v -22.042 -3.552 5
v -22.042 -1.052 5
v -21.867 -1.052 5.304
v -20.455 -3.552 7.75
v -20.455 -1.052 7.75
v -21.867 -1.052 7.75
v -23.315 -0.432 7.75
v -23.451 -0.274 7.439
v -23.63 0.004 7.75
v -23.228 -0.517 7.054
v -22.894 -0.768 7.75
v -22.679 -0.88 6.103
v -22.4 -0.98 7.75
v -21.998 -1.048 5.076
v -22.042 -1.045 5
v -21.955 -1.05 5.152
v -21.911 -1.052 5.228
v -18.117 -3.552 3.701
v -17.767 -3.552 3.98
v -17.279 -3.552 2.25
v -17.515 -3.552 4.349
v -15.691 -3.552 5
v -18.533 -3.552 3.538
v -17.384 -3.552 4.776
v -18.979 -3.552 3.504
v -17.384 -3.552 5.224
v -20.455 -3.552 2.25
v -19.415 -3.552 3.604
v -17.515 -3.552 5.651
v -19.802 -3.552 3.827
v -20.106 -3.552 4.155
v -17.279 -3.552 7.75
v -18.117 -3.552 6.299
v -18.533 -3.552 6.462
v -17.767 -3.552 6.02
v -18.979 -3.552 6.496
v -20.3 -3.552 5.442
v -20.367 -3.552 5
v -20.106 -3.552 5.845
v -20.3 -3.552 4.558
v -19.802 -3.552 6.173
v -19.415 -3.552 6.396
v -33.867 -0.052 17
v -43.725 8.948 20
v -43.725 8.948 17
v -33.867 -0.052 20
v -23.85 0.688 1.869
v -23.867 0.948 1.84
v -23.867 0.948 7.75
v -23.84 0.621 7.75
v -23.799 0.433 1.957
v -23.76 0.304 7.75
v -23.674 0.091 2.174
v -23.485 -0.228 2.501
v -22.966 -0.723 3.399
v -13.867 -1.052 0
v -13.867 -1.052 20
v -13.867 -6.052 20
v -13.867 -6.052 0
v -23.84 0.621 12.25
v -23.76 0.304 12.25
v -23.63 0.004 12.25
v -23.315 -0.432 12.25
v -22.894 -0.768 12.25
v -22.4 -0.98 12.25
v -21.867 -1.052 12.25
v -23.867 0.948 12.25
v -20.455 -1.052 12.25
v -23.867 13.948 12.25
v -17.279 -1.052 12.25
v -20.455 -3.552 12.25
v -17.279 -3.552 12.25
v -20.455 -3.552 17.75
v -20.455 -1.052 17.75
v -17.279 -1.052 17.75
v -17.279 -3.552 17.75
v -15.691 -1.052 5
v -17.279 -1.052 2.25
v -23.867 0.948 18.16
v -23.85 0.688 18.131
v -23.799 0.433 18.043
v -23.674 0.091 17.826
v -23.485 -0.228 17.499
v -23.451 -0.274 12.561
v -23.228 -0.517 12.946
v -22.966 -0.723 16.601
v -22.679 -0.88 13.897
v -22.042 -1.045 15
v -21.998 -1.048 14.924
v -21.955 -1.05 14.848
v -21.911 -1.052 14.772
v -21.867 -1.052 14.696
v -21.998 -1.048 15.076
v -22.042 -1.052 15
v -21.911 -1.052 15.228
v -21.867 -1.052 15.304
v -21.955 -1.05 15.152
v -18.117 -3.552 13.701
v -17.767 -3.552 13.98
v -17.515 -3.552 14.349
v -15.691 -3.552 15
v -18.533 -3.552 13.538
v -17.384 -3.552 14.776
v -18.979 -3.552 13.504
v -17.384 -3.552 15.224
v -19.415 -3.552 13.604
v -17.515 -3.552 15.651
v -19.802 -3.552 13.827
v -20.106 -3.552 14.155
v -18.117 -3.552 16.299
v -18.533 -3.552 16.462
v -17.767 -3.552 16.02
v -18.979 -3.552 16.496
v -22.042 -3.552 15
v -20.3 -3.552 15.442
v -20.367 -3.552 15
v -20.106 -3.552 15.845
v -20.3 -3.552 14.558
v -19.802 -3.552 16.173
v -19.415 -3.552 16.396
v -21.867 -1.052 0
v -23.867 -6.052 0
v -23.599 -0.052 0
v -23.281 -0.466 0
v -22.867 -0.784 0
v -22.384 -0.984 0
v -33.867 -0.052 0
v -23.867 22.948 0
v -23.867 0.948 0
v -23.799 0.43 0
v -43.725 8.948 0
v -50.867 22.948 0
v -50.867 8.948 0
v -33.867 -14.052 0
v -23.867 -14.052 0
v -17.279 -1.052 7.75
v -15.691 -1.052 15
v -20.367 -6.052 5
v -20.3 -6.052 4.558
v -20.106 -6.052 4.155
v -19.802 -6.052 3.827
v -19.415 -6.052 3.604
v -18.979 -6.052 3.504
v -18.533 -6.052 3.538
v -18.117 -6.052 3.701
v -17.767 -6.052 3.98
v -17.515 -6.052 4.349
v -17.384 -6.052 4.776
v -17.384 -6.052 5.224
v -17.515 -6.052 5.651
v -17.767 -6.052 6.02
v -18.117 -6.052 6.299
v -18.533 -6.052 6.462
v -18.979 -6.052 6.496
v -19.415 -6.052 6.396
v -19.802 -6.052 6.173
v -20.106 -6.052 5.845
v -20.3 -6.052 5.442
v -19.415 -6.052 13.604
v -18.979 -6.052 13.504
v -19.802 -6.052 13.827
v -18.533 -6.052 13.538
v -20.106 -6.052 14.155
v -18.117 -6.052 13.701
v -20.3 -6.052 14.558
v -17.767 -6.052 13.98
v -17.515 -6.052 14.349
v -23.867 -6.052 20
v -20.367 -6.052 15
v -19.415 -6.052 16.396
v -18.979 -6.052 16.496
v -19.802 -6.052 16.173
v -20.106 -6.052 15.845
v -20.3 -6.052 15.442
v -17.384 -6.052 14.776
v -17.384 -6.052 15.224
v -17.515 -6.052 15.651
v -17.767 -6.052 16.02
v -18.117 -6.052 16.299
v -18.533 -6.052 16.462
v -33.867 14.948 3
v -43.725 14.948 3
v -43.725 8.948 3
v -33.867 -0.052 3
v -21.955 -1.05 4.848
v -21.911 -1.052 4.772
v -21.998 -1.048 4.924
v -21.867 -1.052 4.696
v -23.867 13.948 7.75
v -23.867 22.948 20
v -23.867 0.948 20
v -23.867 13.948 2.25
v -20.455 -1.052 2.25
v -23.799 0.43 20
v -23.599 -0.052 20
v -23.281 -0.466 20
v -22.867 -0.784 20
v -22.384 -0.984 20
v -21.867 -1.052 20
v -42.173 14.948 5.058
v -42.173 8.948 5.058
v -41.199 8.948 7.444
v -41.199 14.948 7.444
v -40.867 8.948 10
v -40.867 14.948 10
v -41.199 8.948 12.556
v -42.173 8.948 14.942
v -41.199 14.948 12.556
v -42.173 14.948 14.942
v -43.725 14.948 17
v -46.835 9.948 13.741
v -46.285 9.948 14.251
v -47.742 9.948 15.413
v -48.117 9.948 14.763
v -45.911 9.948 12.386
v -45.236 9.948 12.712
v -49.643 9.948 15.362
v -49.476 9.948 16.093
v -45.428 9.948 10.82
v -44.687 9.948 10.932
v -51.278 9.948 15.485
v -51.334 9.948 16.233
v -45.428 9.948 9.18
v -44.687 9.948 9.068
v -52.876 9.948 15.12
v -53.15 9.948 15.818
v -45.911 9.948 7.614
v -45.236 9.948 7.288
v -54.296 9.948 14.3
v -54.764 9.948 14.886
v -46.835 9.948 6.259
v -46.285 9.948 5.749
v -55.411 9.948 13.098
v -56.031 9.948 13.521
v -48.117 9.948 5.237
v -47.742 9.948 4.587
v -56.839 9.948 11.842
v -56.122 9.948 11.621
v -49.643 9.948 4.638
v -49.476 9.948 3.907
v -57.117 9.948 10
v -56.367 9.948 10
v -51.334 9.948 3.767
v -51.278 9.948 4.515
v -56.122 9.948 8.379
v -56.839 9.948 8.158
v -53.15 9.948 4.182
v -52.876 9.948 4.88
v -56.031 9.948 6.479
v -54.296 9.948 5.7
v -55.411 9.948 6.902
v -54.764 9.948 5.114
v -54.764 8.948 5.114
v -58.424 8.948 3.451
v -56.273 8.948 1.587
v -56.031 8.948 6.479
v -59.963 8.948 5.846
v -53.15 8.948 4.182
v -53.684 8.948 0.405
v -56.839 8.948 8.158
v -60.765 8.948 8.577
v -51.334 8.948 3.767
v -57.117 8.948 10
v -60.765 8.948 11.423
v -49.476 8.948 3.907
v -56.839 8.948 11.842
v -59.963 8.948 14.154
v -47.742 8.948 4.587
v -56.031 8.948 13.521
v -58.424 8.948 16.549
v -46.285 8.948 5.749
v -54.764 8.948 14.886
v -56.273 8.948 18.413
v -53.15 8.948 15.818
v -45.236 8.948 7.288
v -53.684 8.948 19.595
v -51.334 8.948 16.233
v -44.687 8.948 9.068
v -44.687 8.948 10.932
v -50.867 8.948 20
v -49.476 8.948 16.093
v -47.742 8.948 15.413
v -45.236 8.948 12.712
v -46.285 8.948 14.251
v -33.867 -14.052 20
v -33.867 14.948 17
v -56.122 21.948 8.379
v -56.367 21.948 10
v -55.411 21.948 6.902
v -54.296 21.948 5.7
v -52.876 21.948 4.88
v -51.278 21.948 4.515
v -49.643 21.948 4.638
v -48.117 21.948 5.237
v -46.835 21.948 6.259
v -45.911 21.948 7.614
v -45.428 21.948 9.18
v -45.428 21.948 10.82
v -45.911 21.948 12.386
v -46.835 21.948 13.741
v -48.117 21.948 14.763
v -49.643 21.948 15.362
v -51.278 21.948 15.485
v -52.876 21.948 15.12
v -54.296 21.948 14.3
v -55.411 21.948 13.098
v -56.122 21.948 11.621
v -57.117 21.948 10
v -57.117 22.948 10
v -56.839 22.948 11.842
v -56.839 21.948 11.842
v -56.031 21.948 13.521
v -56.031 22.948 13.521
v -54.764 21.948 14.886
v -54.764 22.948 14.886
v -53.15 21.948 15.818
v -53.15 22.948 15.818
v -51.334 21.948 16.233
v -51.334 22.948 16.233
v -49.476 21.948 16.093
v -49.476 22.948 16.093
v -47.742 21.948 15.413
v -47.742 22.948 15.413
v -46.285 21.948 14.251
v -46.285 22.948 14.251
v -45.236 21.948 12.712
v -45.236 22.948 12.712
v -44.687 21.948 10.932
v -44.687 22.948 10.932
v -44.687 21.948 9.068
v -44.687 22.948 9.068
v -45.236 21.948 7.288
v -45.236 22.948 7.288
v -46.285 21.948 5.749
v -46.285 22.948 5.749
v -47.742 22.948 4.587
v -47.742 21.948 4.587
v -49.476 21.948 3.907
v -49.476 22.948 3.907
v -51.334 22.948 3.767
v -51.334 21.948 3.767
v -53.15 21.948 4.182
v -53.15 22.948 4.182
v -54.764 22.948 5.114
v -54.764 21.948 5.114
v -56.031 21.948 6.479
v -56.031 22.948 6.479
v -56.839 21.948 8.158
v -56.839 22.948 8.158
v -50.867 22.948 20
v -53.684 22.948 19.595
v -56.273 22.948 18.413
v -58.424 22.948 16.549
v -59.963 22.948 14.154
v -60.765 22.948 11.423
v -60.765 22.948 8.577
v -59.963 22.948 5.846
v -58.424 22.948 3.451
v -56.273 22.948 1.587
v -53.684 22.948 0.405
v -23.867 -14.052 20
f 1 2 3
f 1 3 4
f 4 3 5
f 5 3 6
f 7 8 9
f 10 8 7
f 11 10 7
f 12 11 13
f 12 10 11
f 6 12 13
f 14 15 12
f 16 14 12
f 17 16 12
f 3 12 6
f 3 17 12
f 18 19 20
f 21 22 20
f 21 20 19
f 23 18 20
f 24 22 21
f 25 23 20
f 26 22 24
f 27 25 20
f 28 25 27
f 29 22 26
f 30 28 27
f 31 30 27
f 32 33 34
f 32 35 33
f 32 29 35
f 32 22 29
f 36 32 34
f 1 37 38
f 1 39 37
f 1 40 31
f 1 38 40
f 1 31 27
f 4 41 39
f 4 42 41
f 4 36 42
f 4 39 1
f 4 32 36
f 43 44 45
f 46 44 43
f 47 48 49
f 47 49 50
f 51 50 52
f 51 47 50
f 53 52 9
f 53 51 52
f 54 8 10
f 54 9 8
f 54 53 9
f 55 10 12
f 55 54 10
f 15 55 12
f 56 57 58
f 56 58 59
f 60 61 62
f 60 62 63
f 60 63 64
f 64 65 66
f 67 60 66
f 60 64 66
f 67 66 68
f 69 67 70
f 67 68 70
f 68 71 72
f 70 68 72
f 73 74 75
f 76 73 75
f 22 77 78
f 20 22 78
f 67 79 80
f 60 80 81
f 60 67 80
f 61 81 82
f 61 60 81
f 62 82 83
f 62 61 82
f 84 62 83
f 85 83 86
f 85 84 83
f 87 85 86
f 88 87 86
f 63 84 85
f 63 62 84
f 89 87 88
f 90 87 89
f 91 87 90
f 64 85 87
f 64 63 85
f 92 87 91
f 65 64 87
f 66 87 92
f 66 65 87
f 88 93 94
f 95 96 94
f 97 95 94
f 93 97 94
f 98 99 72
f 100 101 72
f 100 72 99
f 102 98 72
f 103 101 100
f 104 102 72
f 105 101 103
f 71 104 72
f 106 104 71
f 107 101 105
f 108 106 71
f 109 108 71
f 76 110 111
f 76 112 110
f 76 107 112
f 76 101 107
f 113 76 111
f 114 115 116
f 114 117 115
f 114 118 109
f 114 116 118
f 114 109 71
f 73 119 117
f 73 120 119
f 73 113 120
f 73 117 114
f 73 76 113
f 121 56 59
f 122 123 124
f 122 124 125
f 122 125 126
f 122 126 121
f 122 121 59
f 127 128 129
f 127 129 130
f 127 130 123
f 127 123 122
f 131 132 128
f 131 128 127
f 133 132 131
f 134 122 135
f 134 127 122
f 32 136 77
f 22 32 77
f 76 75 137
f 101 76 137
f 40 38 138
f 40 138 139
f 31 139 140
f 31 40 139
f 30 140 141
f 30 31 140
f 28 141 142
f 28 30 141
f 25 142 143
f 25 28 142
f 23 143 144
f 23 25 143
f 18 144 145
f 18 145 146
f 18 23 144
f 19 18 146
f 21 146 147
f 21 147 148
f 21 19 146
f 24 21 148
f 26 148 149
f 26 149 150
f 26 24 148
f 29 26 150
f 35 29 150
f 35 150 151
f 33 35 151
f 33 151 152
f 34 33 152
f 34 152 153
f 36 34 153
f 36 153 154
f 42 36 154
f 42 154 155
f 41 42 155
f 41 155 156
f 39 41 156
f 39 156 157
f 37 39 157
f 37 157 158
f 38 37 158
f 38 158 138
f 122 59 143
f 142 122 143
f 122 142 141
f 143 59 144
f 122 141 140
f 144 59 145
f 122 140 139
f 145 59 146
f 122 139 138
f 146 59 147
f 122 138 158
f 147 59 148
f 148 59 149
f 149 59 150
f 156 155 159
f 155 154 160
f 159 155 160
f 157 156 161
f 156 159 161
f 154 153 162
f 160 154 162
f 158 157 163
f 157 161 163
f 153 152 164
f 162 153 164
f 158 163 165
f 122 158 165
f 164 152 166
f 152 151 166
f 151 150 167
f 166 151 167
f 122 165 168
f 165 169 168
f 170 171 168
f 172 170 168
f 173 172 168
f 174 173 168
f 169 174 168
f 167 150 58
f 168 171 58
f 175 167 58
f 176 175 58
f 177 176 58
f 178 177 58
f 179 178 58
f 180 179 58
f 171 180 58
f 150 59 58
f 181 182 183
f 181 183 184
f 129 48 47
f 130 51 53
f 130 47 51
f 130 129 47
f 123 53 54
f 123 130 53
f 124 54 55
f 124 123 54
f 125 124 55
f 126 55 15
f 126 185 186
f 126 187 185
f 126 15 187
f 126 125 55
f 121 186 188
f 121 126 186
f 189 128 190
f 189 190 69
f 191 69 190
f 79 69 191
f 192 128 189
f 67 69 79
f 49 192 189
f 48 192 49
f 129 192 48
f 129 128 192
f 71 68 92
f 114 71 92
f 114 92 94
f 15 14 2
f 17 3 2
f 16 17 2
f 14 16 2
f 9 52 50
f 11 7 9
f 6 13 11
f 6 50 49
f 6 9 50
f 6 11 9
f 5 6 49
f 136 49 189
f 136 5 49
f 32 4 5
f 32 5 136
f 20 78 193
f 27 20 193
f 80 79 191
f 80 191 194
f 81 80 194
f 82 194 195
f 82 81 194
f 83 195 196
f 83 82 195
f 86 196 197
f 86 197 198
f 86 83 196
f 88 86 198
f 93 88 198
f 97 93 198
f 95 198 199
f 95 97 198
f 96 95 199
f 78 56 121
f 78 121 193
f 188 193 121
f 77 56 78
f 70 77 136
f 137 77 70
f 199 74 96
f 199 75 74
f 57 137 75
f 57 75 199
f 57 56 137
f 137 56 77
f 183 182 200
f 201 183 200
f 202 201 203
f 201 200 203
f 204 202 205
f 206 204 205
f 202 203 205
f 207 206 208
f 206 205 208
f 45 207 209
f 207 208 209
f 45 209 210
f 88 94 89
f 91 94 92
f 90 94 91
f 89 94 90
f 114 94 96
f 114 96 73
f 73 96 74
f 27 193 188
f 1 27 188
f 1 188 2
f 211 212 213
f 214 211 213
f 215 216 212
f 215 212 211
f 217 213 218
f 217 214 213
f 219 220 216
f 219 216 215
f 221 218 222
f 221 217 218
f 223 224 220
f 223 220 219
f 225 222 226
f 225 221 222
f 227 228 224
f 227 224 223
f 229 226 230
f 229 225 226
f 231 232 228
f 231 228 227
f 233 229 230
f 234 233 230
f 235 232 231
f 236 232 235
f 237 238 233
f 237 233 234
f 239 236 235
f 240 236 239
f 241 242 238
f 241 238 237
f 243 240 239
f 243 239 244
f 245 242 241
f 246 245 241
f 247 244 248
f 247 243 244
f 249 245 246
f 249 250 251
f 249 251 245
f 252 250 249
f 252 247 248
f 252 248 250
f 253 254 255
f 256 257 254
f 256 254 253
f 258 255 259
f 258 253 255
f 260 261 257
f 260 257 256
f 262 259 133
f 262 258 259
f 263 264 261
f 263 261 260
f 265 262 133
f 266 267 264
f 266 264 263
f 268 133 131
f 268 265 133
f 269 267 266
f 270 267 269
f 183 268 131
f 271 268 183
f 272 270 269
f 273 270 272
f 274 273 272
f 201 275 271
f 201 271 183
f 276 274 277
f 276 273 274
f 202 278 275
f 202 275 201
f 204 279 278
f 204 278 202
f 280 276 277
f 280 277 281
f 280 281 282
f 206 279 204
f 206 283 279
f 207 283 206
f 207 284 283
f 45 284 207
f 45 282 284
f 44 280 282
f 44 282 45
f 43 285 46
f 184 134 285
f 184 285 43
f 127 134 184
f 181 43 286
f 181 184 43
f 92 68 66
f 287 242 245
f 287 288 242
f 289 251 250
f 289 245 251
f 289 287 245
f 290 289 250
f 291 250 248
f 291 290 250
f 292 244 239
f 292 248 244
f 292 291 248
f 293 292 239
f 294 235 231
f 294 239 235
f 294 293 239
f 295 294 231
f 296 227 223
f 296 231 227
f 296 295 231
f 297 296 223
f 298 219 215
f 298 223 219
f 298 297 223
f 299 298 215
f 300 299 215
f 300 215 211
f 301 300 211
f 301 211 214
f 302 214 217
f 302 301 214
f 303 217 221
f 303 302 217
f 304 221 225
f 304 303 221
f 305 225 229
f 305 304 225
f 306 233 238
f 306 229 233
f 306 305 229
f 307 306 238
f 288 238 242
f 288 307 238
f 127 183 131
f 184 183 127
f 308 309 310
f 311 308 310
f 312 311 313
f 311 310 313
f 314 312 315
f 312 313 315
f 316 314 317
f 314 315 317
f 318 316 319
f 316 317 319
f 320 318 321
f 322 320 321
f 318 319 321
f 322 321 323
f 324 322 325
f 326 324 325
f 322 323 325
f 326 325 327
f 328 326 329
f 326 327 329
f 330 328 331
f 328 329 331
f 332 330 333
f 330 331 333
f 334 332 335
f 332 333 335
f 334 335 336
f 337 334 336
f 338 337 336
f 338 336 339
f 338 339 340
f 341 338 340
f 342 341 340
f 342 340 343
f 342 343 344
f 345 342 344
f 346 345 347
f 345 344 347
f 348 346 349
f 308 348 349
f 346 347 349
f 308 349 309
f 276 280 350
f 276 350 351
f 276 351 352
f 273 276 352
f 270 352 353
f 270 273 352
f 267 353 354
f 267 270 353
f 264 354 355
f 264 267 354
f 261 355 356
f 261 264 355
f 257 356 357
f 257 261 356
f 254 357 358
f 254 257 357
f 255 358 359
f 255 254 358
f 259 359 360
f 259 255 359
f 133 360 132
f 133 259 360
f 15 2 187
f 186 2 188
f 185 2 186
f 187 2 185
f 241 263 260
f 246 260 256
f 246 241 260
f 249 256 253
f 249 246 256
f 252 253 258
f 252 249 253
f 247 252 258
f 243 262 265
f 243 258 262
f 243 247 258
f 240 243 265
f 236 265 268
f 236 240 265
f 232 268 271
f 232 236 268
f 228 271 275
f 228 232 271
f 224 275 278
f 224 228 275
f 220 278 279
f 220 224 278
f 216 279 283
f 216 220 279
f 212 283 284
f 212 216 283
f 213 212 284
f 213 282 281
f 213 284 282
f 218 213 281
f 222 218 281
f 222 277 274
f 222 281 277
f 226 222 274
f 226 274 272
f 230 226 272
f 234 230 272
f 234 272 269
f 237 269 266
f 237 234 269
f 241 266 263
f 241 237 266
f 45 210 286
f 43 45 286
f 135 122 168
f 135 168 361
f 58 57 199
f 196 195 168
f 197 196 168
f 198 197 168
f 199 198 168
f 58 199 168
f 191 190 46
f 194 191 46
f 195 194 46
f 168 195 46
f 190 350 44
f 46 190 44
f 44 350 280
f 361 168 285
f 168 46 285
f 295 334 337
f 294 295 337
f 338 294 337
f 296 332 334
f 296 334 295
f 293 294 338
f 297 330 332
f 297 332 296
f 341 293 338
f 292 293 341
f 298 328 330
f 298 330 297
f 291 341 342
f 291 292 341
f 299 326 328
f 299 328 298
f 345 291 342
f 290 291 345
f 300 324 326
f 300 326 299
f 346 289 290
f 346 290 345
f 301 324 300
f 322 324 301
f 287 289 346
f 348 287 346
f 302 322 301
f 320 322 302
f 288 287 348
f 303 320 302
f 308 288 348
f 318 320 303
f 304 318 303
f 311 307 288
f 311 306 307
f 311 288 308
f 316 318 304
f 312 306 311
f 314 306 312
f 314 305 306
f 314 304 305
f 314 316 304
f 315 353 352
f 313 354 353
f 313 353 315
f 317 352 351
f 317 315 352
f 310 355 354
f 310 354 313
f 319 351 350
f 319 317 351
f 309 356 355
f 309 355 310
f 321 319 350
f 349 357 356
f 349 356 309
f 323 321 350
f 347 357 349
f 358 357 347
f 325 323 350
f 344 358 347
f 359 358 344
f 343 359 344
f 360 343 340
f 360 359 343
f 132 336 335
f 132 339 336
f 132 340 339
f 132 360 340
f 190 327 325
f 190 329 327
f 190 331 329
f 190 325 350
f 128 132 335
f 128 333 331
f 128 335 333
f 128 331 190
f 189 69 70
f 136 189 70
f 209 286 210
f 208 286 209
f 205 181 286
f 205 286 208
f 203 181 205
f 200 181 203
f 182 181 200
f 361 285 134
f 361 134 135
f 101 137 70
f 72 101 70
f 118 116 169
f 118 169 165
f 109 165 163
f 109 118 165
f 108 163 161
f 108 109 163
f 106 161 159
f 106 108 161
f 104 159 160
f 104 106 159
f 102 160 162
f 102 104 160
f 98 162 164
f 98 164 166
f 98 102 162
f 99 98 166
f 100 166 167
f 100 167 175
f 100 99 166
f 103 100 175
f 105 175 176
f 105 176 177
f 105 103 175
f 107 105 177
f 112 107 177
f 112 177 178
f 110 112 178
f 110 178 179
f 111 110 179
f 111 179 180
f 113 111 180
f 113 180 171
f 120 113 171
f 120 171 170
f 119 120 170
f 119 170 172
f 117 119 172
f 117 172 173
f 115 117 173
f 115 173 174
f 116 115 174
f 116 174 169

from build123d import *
from build123d.topology import SkipClean

# Parameters (mm, degrees)
EXTRUDE_1_DEPTH           = 20
SKETCH_3_R                = 5.5
CUT_EXTRUDE_2_DEPTH       = 10
SKETCH_9_R                = 6.25
CUT_EXTRUDE_6_DEPTH       = 1
SKETCH_11_W               = 20
SKETCH_11_H               = 5
EXTRUDE_4_DEPTH           = 10
CUT_EXTRUDE_8_REACH       = 78.472
SKETCH_12_R               = 1.5
SKETCH_13_R               = 3
CUT_EXTRUDE_9_DEPTH       = 2.5
SKETCH_14_R               = 10
SKETCH_14_R_2             = 5.5
EXTRUDE_5_DEPTH           = 6
CUT_EXTRUDE_START         = -1
SKETCH_6_R                = 6.25
CUT_EXTRUDE_10_DEPTH      = 1
SKETCH_15_W               = 20
SKETCH_15_H               = 5
EXTRUDE_6_DEPTH           = 5
SKETCH_16_W               = 17
SKETCH_16_H               = 3
EXTRUDE_7_DEPTH           = 15
CUT_EXTRUDE_11_DEPTH      = 70.961190435
CUT_EXTRUDE_11_DEPTH_BACK = 70.961190435
EXTRUDE_START             = -5
SKETCH_3D_3_R             = 1.5
EXTRUDE_8_DEPTH           = 5
CUT_EXTRUDE_12_DEPTH      = 2.5
FILLET_1_R                = 2
CUT_EXTRUDE_14_DEPTH      = 76.06644022
SKETCH_21_W               = 6.587713241
SKETCH_21_H               = 4.5
EXTRUDE_9_DEPTH           = 15
SKETCH_23_W               = 25
SKETCH_23_H               = 20
CUT_EXTRUDE_16_DEPTH      = 5
CUT_EXTRUDE_17_DEPTH      = 10


with BuildPart() as part:
    # 草图1 → 凸台-拉伸1 (new body)
    with BuildSketch(Plane.XY):
        Polygon((-63.866818046, 22.947717095), (-23.866818046, 22.947717095), (-23.866818046, -19.052282905), (-33.866818046, -19.052282905), (-33.866818046, 14.947717095), (-63.866818046, 14.947717095), align=None)
    extrude(amount=EXTRUDE_1_DEPTH)

    # 草图3 → 切除-拉伸2 (cut)
    with BuildSketch(Plane(origin=(0, 22.947717095, 0), x_dir=(-1, 0, 0), z_dir=(0, 1, 0))):
        with Locations((50.866818046, 10)):
            Circle(SKETCH_3_R)
    extrude(amount=-CUT_EXTRUDE_2_DEPTH, mode=Mode.SUBTRACT)

    # 草图9 → 切除-拉伸6 (cut)
    with BuildSketch(Plane(origin=(0, 22.947717095, 0), x_dir=(1, 0, 0), z_dir=(0, 1, 0))):
        with Locations(Location((-50.866818046, -10, 0), (0, 0, 180))):
            Circle(SKETCH_9_R)
    extrude(amount=-CUT_EXTRUDE_6_DEPTH, mode=Mode.SUBTRACT)

    # 草图11 → 凸台-拉伸4 (add)
    with BuildSketch(Plane(origin=(-23.866818046, 0, 0), x_dir=(0, 0, -1), z_dir=(1, 0, 0))):
        with Locations((-10, -16.552282905)):
            Rectangle(SKETCH_11_W, SKETCH_11_H)
    extrude(amount=EXTRUDE_4_DEPTH)

    # 草图12 → 切除-拉伸8 (cut, up to next)
    with BuildSketch(Plane(origin=(0, -14.052282905, 0), x_dir=(-1, 0, 0), z_dir=(0, 1, 0)), mode=Mode.PRIVATE) as cut_extrude_8_sk1:
        with Locations((18.866818046, 5)):
            Circle(SKETCH_12_R)
    cut_extrude_8_tool1 = extrude(cut_extrude_8_sk1.sketch, amount=-CUT_EXTRUDE_8_REACH, mode=Mode.PRIVATE) & part.part
    # 草图12 → 切除-拉伸8 (cut, up to next)
    with BuildSketch(Plane(origin=(0, -14.052282905, 0), x_dir=(-1, 0, 0), z_dir=(0, 1, 0)), mode=Mode.PRIVATE) as cut_extrude_8_sk2:
        with Locations((18.866818046, 15)):
            Circle(SKETCH_12_R)
    cut_extrude_8_tool2 = extrude(cut_extrude_8_sk2.sketch, amount=-CUT_EXTRUDE_8_REACH, mode=Mode.PRIVATE) & part.part
    add(cut_extrude_8_tool1.solids().sort_by_distance((-18.866818, -14.052283, 5))[0], mode=Mode.SUBTRACT)
    add(cut_extrude_8_tool2.solids().sort_by_distance((-18.866818, -14.052283, 15))[0], mode=Mode.SUBTRACT)

    # 草图13 → 切除-拉伸9 (cut)
    with BuildSketch(Plane.XZ.offset(19.052282905)):
        with Locations(Location((-18.866818046, 15, 0), (0, 0, 270))):
            Circle(SKETCH_13_R)
        with Locations(Location((-18.866818046, 5, 0), (0, 0, 270))):
            Circle(SKETCH_13_R)
    extrude(amount=-CUT_EXTRUDE_9_DEPTH, mode=Mode.SUBTRACT)

    # 草图14 → 凸台-拉伸5 (add)
    with SkipClean():  # the faces are left unmerged after this step: merging them gives an invalid solid
        with BuildSketch(Plane.XZ.offset(-14.947717095)):
            with Locations(Location((-50.866818046, 10, 0), (0, 0, 270))):
                Circle(SKETCH_14_R)
            with Locations(Location((-50.866818046, 10, 0), (0, 0, 180))):
                Circle(SKETCH_14_R_2, mode=Mode.SUBTRACT)
        extrude(amount=EXTRUDE_5_DEPTH)

    # 草图6 → 切除-拉伸10 (cut)
    with BuildSketch(Plane.XZ.offset(-8.947717095).offset(CUT_EXTRUDE_START)):
        with Locations(Location((-50.866818046, 10, 0), (0, 0, 180))):
            Circle(SKETCH_6_R)
    extrude(amount=CUT_EXTRUDE_10_DEPTH, mode=Mode.SUBTRACT)

    # 草图15 → 凸台-拉伸6 (add)
    with BuildSketch(Plane(origin=(-13.866818046, 0, 0), x_dir=(0, 0, -1), z_dir=(1, 0, 0))):
        with Locations((-10, -16.552282905)):
            Rectangle(SKETCH_15_W, SKETCH_15_H)
    extrude(amount=EXTRUDE_6_DEPTH)

    # 草图16 → 凸台-拉伸7 (add)
    with BuildSketch(Plane.XZ.offset(-14.947717095)):
        with Locations((-42.366818046, 18.5)):
            Rectangle(SKETCH_16_W, SKETCH_16_H)
        with Locations((-42.366818046, 1.5)):
            Rectangle(SKETCH_16_W, SKETCH_16_H)
    extrude(amount=EXTRUDE_7_DEPTH)

    # 草图17 → 切除-拉伸11 (cut, two sides: drawn at the far end of the back side and taken through both)
    with BuildSketch(Plane(origin=(0, 0, 17), x_dir=(-1, 0, 0), z_dir=(0, 0, -1)).offset(-CUT_EXTRUDE_11_DEPTH_BACK)):
        Polygon((50.866818046, 8.947717095), (43.725389617, 8.947717095), (33.866818046, -0.052282905), (50.866818046, -0.052282905), align=None)
    extrude(amount=CUT_EXTRUDE_11_DEPTH + CUT_EXTRUDE_11_DEPTH_BACK, mode=Mode.SUBTRACT)

    # Sketch 3D_3 → 凸台-拉伸8 (add)
    with BuildSketch(Plane(origin=(-23.866818046, -6.052282905, 20), x_dir=(0.447213595499958, 0, -0.894427190999916), z_dir=(0, -1, 0)).offset(EXTRUDE_START)):
        Polygon((0, 0), (4.472135955, 8.94427191), (22.360679775, 0), (17.88854382, -8.94427191), align=None)
        with Locations(Location((6.708203932, 2.236067977, 0), (0, 0, 243.434948823))):
            Circle(SKETCH_3D_3_R, mode=Mode.SUBTRACT)
        with Locations(Location((15.652475842, -2.236067977, 0), (0, 0, 243.434948823))):
            Circle(SKETCH_3D_3_R, mode=Mode.SUBTRACT)
    extrude(amount=EXTRUDE_8_DEPTH)

    # 草图18 → 切除-拉伸12 (cut)
    with BuildSketch(Plane(origin=(0, -1.052282905, 0), x_dir=(-1, 0, 0), z_dir=(0, 1, 0))):
        Polygon((15.691391565, 15), (17.279104805, 12.25), (20.454531286, 12.25), (22.042244526, 15), (20.454531286, 17.75), (17.279104805, 17.75), align=None)
        Polygon((15.691391565, 5), (17.279104805, 2.25), (20.454531286, 2.25), (22.042244526, 5), (20.454531286, 7.75), (17.279104805, 7.75), align=None)
    extrude(amount=-CUT_EXTRUDE_12_DEPTH, mode=Mode.SUBTRACT)

    # 圆角1
    # the kernel refuses this fillet: 2 mm, written as the material it adds along each edge
    with BuildSketch(Plane(origin=(-23.866818046, -1.052282905, 0), x_dir=(0, 1, 0), z_dir=(0, 0, 1))) as fillet_1_piece_1_section:
        with BuildLine():
            CenterArc((FILLET_1_R, -FILLET_1_R), FILLET_1_R, 90, 90)
            Line((0, -FILLET_1_R), (0, 0))
            Line((0, 0), (FILLET_1_R, 0))
        make_face()
    fillet_1_piece_1 = extrude(amount=20, mode=Mode.PRIVATE)
    fillet_1_piece_1 = split(fillet_1_piece_1, bisect_by=Plane(origin=(-20.802583542, -0.671658343, 2.852844192), z_dir=(-0.8660254037844387, 0, -0.5000000000000001)), keep=Keep.TOP, mode=Mode.PRIVATE)
    fillet_1_piece_1 = split(fillet_1_piece_1, bisect_by=Plane(origin=(-23.907001975, -0.671658343, 1.770145354), z_dir=(0.8660254037844387, 0, -0.5000000000000003)), keep=Keep.TOP, mode=Mode.PRIVATE)
    add(fillet_1_piece_1)
    with BuildSketch(Plane(origin=(-23.866818046, -1.052282905, 0), x_dir=(0, 1, 0), z_dir=(0, 0, 1))) as fillet_1_piece_2_section:
        with BuildLine():
            CenterArc((FILLET_1_R, -FILLET_1_R), FILLET_1_R, 90, 90)
            Line((0, -FILLET_1_R), (0, 0))
            Line((0, 0), (FILLET_1_R, 0))
        make_face()
    fillet_1_piece_2 = extrude(amount=20, mode=Mode.PRIVATE)
    fillet_1_piece_2 = split(fillet_1_piece_2, bisect_by=Plane(origin=(-22.4188867, -0.519681884, 5.652363381), z_dir=(-0.8660254037844387, 0, -0.5000000000000001)), keep=Keep.TOP, mode=Mode.PRIVATE)
    fillet_1_piece_2 = split(fillet_1_piece_2, bisect_by=Plane(origin=(-22.4188867, -0.519681884, 4.347636619), z_dir=(-0.8660254037844387, 0, 0.5000000000000003)), keep=Keep.TOP, mode=Mode.PRIVATE)
    add(fillet_1_piece_2)
    with BuildSketch(Plane(origin=(-23.866818046, -1.052282905, 0), x_dir=(0, 1, 0), z_dir=(0, 0, 1))) as fillet_1_piece_3_section:
        with BuildLine():
            CenterArc((FILLET_1_R, -FILLET_1_R), FILLET_1_R, 90, 90)
            Line((0, -FILLET_1_R), (0, 0))
            Line((0, 0), (FILLET_1_R, 0))
        make_face()
    fillet_1_piece_3 = extrude(amount=20, mode=Mode.PRIVATE)
    fillet_1_piece_3 = split(fillet_1_piece_3, bisect_by=Plane(origin=(-24.519856268, -0.671658343, 9.291349419), z_dir=(0.8660254037844387, 0, 0.5000000000000001)), keep=Keep.TOP, mode=Mode.PRIVATE)
    fillet_1_piece_3 = split(fillet_1_piece_3, bisect_by=Plane(origin=(-20.189729249, -0.671658343, 8.208650581), z_dir=(-0.8660254037844387, 0, 0.5000000000000003)), keep=Keep.TOP, mode=Mode.PRIVATE)
    fillet_1_piece_3 = split(fillet_1_piece_3, bisect_by=Plane(origin=(-20.189729249, -0.671658343, 11.791349419), z_dir=(-0.8660254037844387, 0, -0.5)), keep=Keep.TOP, mode=Mode.PRIVATE)
    fillet_1_piece_3 = split(fillet_1_piece_3, bisect_by=Plane(origin=(-24.519856268, -0.671658343, 10.708650581), z_dir=(0.8660254037844384, 0, -0.5000000000000004)), keep=Keep.TOP, mode=Mode.PRIVATE)
    add(fillet_1_piece_3)
    with BuildSketch(Plane(origin=(-23.866818046, -1.052282905, 0), x_dir=(0, 1, 0), z_dir=(0, 0, 1))) as fillet_1_piece_4_section:
        with BuildLine():
            CenterArc((FILLET_1_R, -FILLET_1_R), FILLET_1_R, 90, 90)
            Line((0, -FILLET_1_R), (0, 0))
            Line((0, 0), (FILLET_1_R, 0))
        make_face()
    fillet_1_piece_4 = extrude(amount=20, mode=Mode.PRIVATE)
    fillet_1_piece_4 = split(fillet_1_piece_4, bisect_by=Plane(origin=(-22.4188867, -0.519681884, 15.652363381), z_dir=(-0.8660254037844387, 0, -0.5)), keep=Keep.TOP, mode=Mode.PRIVATE)
    fillet_1_piece_4 = split(fillet_1_piece_4, bisect_by=Plane(origin=(-22.4188867, -0.519681884, 14.347636619), z_dir=(-0.8660254037844384, 0, 0.5000000000000004)), keep=Keep.TOP, mode=Mode.PRIVATE)
    add(fillet_1_piece_4)
    with BuildSketch(Plane(origin=(-23.866818046, -1.052282905, 0), x_dir=(0, 1, 0), z_dir=(0, 0, 1))) as fillet_1_piece_5_section:
        with BuildLine():
            CenterArc((FILLET_1_R, -FILLET_1_R), FILLET_1_R, 90, 90)
            Line((0, -FILLET_1_R), (0, 0))
            Line((0, 0), (FILLET_1_R, 0))
        make_face()
    fillet_1_piece_5 = extrude(amount=20, mode=Mode.PRIVATE)
    fillet_1_piece_5 = split(fillet_1_piece_5, bisect_by=Plane(origin=(-23.907001975, -0.671658343, 18.229854646), z_dir=(0.8660254037844387, 0, 0.5)), keep=Keep.TOP, mode=Mode.PRIVATE)
    fillet_1_piece_5 = split(fillet_1_piece_5, bisect_by=Plane(origin=(-20.802583542, -0.671658343, 17.147155808), z_dir=(-0.8660254037844384, 0, 0.5000000000000004)), keep=Keep.TOP, mode=Mode.PRIVATE)
    add(fillet_1_piece_5)

    # 草图20 → 切除-拉伸14 (cut, through all)
    with SkipClean():  # the faces are left unmerged after this step: merging them gives an invalid solid
        with BuildSketch(Plane.XZ.offset(-14.947717095)):
            with BuildLine():
                Line((-63.866818046, 20), (-50.866818046, 20))
                ThreePointArc((-50.866818046, 20), (-60.866818046, 10), (-50.866818046, 0))
                Line((-50.866818046, 0), (-63.866818046, 0))
                Line((-63.866818046, 0), (-63.866818046, 20))
            make_face()
        extrude(amount=-CUT_EXTRUDE_14_DEPTH, mode=Mode.SUBTRACT)
    add(part.part.scale(1), mode=Mode.REPLACE)  # the faces are merged on a copy

    # 草图21 → 凸台-拉伸9 (add)
    with BuildSketch(Plane(origin=(0, -1.052282905, 0), x_dir=(1, 0, 0), z_dir=(0, 1, 0))):
        with Locations((-20.572961426, -10)):
            Rectangle(SKETCH_21_W, SKETCH_21_H)
    extrude(amount=EXTRUDE_9_DEPTH)

    # 草图23 → 切除-拉伸16 (cut)
    with BuildSketch(Plane.XZ.offset(19.052282905)):
        with Locations((-21.366818046, 10)):
            Rectangle(SKETCH_23_W, SKETCH_23_H)
    extrude(amount=-CUT_EXTRUDE_16_DEPTH, mode=Mode.SUBTRACT)

    # 草图24 → 切除-拉伸17 (cut)
    with BuildSketch(Plane.XY.offset(12.25)):
        Polygon((-23.866818046, 13.947717095), (-17.279104805, -1.052282905), (-17.279104805, 13.947717095), align=None)
    extrude(amount=-CUT_EXTRUDE_17_DEPTH, mode=Mode.SUBTRACT)


solid = part.part
